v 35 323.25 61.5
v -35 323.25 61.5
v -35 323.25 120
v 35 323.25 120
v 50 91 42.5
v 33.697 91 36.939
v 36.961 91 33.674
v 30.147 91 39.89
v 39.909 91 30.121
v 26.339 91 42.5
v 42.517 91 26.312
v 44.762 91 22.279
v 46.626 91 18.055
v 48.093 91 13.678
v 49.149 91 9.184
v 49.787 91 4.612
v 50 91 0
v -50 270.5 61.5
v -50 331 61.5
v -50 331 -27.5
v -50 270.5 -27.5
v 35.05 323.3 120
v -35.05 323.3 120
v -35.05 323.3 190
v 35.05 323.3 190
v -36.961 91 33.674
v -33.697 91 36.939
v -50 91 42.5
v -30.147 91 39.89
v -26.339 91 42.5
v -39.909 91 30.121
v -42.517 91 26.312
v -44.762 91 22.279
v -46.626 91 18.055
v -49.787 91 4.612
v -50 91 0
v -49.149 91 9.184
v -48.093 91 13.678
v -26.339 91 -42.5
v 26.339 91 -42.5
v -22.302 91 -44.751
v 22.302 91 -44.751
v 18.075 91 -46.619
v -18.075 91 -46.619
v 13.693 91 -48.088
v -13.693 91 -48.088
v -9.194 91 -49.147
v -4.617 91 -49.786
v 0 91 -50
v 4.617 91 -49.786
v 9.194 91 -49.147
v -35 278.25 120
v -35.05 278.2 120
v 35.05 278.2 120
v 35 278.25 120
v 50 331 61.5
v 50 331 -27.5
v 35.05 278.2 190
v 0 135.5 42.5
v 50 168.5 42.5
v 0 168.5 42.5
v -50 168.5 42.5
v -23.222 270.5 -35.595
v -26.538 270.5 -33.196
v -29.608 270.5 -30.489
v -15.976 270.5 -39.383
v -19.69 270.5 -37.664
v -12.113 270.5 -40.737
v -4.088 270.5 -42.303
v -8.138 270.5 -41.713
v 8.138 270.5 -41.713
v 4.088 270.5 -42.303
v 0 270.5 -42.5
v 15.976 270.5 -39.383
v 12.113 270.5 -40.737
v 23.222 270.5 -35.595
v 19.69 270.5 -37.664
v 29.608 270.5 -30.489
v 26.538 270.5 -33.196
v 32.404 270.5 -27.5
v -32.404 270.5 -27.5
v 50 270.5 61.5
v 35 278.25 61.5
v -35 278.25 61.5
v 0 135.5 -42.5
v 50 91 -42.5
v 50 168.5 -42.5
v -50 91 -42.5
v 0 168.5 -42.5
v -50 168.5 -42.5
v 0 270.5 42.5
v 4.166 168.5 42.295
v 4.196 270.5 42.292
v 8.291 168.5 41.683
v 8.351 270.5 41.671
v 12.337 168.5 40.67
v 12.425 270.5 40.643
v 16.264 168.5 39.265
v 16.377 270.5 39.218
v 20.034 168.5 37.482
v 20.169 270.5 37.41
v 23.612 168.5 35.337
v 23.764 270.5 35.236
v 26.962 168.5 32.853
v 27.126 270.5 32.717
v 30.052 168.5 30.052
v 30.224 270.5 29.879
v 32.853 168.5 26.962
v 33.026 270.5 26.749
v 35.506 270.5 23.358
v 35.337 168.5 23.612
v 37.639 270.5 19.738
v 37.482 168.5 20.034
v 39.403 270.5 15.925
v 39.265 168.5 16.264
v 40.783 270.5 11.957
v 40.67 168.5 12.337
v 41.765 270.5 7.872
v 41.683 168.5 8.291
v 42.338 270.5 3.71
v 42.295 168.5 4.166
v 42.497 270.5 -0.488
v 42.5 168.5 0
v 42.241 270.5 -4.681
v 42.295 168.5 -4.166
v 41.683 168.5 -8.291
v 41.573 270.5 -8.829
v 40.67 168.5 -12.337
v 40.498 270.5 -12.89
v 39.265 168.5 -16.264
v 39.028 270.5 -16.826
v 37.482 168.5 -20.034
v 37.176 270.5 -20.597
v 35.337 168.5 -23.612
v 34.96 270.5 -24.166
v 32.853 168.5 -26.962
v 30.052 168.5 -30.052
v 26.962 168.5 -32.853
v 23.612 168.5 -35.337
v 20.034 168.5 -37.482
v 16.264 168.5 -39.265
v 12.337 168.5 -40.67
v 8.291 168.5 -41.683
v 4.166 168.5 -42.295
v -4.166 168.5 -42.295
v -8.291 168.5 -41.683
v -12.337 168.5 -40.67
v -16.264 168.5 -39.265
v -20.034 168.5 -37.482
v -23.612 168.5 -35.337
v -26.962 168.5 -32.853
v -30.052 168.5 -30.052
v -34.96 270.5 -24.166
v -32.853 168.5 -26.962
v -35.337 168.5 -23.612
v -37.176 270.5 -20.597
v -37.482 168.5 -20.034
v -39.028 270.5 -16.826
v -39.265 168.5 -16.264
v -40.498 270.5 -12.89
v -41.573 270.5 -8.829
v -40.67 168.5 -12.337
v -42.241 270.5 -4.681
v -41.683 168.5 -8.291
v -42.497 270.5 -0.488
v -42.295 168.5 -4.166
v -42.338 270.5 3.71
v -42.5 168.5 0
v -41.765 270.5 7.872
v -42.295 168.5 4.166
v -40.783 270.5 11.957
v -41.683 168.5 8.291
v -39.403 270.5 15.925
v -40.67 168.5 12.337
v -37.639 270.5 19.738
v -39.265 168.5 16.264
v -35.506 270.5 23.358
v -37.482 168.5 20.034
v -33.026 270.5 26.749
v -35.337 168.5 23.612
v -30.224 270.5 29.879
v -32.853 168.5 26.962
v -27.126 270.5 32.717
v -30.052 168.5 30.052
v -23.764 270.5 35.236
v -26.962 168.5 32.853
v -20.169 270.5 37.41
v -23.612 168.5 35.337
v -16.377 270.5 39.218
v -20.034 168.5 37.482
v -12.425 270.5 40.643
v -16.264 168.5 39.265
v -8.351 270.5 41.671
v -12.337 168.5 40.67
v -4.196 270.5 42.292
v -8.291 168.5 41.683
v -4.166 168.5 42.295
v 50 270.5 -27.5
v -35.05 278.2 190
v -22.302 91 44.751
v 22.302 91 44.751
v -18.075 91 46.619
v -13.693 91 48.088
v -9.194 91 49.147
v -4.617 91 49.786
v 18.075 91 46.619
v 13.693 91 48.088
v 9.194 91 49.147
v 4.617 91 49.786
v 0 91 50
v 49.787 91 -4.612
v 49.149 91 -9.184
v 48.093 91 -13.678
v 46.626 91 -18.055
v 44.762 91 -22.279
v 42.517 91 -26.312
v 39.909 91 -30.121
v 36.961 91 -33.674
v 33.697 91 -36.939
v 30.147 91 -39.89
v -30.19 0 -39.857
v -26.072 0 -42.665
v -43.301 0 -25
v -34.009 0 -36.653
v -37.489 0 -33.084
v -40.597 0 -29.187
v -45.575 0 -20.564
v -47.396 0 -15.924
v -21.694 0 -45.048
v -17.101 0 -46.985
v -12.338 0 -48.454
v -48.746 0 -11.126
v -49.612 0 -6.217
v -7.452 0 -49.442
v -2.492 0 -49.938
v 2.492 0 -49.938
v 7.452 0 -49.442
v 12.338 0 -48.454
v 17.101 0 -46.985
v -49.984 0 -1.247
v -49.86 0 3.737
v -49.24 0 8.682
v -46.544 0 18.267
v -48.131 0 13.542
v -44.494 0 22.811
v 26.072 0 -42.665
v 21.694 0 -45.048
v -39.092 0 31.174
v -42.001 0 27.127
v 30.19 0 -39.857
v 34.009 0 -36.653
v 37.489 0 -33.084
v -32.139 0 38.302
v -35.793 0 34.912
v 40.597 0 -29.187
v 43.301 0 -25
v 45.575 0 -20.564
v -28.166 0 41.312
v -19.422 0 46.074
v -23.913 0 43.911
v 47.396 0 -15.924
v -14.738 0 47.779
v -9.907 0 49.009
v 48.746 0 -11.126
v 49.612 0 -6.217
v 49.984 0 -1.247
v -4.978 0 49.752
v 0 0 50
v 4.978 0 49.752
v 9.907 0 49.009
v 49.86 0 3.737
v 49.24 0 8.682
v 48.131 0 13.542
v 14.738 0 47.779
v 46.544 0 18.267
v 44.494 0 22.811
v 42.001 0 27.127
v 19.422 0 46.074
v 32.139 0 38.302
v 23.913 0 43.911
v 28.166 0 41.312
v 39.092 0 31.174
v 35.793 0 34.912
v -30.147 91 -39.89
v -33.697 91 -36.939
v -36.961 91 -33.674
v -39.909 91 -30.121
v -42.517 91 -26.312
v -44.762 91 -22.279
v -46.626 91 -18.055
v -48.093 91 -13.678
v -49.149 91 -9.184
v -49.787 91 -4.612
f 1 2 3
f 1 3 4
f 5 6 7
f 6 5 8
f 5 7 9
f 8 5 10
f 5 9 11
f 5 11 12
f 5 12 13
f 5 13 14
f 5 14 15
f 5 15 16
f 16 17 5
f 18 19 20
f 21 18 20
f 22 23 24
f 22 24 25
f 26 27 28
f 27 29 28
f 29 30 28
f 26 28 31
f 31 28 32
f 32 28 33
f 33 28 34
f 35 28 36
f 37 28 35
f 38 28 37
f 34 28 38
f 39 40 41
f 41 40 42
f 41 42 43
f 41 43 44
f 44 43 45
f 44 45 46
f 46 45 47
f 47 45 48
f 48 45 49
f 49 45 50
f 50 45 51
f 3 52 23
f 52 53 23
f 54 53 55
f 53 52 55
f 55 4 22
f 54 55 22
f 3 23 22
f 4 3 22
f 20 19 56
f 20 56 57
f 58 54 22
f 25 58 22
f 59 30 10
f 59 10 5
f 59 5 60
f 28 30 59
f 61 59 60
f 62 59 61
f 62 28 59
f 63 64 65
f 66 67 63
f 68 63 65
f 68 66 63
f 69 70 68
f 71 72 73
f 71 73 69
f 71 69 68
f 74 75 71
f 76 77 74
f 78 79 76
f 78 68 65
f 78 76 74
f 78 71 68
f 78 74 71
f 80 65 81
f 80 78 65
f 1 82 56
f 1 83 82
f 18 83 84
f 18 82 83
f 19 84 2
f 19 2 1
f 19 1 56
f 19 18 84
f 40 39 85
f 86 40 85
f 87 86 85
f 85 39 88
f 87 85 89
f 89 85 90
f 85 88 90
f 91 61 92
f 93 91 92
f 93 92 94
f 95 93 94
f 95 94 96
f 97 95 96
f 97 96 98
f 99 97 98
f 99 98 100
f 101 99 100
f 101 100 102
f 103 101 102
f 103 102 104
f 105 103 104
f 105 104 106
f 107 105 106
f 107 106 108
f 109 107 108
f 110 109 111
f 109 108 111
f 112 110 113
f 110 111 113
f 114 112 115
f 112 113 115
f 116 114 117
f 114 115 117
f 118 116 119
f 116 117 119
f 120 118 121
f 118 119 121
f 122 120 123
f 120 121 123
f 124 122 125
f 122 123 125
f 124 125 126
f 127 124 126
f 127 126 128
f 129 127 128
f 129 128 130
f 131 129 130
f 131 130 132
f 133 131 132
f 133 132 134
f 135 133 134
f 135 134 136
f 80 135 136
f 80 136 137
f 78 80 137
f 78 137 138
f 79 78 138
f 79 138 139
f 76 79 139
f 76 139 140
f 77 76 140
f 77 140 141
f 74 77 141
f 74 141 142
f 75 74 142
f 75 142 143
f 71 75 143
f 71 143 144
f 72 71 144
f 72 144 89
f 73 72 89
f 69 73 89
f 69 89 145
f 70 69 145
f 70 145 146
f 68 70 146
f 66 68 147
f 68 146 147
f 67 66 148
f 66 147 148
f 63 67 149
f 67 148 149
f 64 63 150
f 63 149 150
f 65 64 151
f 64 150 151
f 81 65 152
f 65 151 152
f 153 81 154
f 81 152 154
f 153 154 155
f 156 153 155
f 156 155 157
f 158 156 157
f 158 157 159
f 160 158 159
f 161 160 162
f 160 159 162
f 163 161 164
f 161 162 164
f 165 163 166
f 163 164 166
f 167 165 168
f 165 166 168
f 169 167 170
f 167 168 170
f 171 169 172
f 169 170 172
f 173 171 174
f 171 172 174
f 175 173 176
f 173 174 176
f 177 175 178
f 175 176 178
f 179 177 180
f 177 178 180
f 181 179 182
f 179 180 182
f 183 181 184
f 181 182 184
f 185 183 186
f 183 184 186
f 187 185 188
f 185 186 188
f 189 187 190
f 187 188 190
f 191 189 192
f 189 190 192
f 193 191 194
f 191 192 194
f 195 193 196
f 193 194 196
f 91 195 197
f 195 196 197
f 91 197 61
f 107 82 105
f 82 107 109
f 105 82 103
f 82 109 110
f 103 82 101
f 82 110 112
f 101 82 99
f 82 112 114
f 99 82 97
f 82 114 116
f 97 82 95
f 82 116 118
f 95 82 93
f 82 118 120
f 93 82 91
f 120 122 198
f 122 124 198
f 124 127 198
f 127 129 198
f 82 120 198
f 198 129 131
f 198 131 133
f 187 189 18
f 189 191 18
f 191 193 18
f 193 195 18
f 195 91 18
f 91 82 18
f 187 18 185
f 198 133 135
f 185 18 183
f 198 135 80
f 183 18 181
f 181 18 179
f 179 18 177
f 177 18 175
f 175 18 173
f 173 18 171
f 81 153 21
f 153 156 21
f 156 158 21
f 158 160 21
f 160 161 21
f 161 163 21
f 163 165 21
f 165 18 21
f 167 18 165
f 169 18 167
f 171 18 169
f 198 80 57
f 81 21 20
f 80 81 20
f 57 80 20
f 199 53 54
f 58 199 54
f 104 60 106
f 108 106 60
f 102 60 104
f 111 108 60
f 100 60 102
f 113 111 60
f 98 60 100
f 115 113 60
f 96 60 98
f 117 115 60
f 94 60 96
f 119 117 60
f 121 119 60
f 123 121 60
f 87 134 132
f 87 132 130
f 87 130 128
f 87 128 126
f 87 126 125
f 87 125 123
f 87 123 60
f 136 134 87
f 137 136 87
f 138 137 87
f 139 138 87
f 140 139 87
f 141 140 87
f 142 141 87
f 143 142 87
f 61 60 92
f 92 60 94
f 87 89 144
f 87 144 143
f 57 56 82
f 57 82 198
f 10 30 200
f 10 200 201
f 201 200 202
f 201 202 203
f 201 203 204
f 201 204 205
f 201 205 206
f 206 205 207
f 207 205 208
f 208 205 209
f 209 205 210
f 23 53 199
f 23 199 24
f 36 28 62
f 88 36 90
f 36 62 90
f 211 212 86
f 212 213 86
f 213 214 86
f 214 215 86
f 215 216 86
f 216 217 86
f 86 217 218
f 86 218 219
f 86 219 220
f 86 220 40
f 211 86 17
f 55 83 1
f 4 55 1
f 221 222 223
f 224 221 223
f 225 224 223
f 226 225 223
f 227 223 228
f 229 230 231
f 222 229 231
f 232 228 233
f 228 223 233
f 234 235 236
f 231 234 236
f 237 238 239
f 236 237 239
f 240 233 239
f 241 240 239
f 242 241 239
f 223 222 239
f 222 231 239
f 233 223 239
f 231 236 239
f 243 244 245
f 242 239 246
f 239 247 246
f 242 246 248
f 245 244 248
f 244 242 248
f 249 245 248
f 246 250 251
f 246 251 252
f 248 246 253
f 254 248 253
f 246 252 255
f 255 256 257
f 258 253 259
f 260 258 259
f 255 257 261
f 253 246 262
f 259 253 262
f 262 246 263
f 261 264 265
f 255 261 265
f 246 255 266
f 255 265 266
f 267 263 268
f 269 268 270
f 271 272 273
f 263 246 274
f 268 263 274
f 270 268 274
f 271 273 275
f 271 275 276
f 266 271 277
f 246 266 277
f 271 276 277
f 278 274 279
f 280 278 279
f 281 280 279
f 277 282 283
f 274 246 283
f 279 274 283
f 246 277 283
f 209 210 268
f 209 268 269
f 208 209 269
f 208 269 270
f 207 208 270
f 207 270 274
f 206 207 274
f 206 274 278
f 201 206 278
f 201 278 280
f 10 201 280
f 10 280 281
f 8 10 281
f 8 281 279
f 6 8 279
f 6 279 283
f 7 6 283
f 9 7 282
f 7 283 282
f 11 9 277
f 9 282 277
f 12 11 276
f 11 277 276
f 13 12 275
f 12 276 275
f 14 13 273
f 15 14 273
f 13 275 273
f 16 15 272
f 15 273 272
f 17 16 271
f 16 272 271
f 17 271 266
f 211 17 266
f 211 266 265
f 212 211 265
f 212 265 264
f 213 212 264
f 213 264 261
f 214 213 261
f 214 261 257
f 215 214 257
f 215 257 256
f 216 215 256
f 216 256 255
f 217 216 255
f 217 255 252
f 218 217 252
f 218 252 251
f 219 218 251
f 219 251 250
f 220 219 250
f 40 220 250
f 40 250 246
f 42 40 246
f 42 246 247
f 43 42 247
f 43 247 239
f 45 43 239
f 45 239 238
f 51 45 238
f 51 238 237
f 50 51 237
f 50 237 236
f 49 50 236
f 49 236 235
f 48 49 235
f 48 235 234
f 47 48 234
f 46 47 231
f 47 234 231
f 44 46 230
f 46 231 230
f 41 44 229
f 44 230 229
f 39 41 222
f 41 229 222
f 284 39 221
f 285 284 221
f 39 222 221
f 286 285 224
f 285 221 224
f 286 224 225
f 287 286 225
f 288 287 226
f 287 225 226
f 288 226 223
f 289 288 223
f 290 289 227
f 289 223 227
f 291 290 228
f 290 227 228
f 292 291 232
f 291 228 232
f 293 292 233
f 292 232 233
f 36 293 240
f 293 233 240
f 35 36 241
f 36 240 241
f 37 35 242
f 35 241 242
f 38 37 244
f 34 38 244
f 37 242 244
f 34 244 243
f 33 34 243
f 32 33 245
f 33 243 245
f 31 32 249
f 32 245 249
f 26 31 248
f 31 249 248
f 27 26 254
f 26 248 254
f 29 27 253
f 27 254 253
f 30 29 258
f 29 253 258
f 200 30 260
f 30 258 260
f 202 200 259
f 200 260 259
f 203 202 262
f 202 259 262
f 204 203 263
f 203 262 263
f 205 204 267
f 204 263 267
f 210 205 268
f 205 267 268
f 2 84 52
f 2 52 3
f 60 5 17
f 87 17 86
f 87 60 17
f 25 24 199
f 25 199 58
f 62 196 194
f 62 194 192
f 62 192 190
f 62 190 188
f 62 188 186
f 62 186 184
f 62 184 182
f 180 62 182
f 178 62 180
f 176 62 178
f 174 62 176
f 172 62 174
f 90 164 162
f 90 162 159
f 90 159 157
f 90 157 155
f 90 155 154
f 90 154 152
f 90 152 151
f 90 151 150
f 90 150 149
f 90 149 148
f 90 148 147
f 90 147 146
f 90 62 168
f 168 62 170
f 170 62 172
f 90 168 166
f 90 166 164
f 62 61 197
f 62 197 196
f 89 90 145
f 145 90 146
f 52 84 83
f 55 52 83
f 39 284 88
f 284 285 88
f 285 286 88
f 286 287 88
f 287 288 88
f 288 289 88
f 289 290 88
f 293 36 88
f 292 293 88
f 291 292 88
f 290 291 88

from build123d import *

# Parameters (mm, degrees)
SKETCH1_R                = 50
BOSS_EXTRUDE1_DEPTH      = 91
BOSS_EXTRUDE2_DEPTH      = 50
BOSS_EXTRUDE2_DEPTH_BACK = 50
SKETCH2_W                = 85
SKETCH2_H                = 77.5
SKETCH4_R                = 42.5
BOSS_EXTRUDE3_DEPTH      = 135
BOSS_EXTRUDE4_DEPTH      = 50
BOSS_EXTRUDE4_DEPTH_BACK = 50
SKETCH5_W                = 89
SKETCH5_H                = 60.5
SKETCH6_W                = 70
SKETCH6_H                = 45
BOSS_EXTRUDE5_DEPTH      = 58.5
SKETCH7_W                = 70.1
SKETCH7_H                = 45.1
BOSS_EXTRUDE6_DEPTH      = 70


with BuildPart() as part:
    # Sketch1 → Boss-Extrude1 (new body)
    with BuildSketch(Plane(origin=(0, 0, 0), x_dir=(1, 0, 0), z_dir=(0, 1, 0))):
        Circle(SKETCH1_R)
    extrude(amount=BOSS_EXTRUDE1_DEPTH)

    # Sketch2 → Boss-Extrude2 (add, two sides: drawn at the far end of the back side and taken through both)
    with BuildSketch(Plane(origin=(0, 0, 0), x_dir=(0, 0, -1), z_dir=(1, 0, 0)).offset(-BOSS_EXTRUDE2_DEPTH_BACK)):
        with Locations((0, 129.75)):
            Rectangle(SKETCH2_W, SKETCH2_H)
    extrude(amount=BOSS_EXTRUDE2_DEPTH + BOSS_EXTRUDE2_DEPTH_BACK)

    # Sketch4 → Boss-Extrude3 (add)
    with BuildSketch(Plane(origin=(0, 135.5, 0), x_dir=(1, 0, 0), z_dir=(0, 1, 0))):
        Circle(SKETCH4_R)
    extrude(amount=BOSS_EXTRUDE3_DEPTH)

    # Sketch5 → Boss-Extrude4 (add, two sides: drawn at the far end of the back side and taken through both)
    with BuildSketch(Plane(origin=(0, 0, 0), x_dir=(0, 0, -1), z_dir=(1, 0, 0)).offset(-BOSS_EXTRUDE4_DEPTH_BACK)):
        with Locations((-17, 300.75)):
            Rectangle(SKETCH5_W, SKETCH5_H)
    extrude(amount=BOSS_EXTRUDE4_DEPTH + BOSS_EXTRUDE4_DEPTH_BACK)

    # Sketch6 → Boss-Extrude5 (add)
    with BuildSketch(Plane.XY.offset(61.5)):
        with Locations((0, 300.75)):
            Rectangle(SKETCH6_W, SKETCH6_H)
    extrude(amount=BOSS_EXTRUDE5_DEPTH)

    # Sketch7 → Boss-Extrude6 (add)
    with BuildSketch(Plane.XY.offset(120)):
        with Locations((0, 300.75)):
            Rectangle(SKETCH7_W, SKETCH7_H)
    extrude(amount=BOSS_EXTRUDE6_DEPTH)


solid = part.part
